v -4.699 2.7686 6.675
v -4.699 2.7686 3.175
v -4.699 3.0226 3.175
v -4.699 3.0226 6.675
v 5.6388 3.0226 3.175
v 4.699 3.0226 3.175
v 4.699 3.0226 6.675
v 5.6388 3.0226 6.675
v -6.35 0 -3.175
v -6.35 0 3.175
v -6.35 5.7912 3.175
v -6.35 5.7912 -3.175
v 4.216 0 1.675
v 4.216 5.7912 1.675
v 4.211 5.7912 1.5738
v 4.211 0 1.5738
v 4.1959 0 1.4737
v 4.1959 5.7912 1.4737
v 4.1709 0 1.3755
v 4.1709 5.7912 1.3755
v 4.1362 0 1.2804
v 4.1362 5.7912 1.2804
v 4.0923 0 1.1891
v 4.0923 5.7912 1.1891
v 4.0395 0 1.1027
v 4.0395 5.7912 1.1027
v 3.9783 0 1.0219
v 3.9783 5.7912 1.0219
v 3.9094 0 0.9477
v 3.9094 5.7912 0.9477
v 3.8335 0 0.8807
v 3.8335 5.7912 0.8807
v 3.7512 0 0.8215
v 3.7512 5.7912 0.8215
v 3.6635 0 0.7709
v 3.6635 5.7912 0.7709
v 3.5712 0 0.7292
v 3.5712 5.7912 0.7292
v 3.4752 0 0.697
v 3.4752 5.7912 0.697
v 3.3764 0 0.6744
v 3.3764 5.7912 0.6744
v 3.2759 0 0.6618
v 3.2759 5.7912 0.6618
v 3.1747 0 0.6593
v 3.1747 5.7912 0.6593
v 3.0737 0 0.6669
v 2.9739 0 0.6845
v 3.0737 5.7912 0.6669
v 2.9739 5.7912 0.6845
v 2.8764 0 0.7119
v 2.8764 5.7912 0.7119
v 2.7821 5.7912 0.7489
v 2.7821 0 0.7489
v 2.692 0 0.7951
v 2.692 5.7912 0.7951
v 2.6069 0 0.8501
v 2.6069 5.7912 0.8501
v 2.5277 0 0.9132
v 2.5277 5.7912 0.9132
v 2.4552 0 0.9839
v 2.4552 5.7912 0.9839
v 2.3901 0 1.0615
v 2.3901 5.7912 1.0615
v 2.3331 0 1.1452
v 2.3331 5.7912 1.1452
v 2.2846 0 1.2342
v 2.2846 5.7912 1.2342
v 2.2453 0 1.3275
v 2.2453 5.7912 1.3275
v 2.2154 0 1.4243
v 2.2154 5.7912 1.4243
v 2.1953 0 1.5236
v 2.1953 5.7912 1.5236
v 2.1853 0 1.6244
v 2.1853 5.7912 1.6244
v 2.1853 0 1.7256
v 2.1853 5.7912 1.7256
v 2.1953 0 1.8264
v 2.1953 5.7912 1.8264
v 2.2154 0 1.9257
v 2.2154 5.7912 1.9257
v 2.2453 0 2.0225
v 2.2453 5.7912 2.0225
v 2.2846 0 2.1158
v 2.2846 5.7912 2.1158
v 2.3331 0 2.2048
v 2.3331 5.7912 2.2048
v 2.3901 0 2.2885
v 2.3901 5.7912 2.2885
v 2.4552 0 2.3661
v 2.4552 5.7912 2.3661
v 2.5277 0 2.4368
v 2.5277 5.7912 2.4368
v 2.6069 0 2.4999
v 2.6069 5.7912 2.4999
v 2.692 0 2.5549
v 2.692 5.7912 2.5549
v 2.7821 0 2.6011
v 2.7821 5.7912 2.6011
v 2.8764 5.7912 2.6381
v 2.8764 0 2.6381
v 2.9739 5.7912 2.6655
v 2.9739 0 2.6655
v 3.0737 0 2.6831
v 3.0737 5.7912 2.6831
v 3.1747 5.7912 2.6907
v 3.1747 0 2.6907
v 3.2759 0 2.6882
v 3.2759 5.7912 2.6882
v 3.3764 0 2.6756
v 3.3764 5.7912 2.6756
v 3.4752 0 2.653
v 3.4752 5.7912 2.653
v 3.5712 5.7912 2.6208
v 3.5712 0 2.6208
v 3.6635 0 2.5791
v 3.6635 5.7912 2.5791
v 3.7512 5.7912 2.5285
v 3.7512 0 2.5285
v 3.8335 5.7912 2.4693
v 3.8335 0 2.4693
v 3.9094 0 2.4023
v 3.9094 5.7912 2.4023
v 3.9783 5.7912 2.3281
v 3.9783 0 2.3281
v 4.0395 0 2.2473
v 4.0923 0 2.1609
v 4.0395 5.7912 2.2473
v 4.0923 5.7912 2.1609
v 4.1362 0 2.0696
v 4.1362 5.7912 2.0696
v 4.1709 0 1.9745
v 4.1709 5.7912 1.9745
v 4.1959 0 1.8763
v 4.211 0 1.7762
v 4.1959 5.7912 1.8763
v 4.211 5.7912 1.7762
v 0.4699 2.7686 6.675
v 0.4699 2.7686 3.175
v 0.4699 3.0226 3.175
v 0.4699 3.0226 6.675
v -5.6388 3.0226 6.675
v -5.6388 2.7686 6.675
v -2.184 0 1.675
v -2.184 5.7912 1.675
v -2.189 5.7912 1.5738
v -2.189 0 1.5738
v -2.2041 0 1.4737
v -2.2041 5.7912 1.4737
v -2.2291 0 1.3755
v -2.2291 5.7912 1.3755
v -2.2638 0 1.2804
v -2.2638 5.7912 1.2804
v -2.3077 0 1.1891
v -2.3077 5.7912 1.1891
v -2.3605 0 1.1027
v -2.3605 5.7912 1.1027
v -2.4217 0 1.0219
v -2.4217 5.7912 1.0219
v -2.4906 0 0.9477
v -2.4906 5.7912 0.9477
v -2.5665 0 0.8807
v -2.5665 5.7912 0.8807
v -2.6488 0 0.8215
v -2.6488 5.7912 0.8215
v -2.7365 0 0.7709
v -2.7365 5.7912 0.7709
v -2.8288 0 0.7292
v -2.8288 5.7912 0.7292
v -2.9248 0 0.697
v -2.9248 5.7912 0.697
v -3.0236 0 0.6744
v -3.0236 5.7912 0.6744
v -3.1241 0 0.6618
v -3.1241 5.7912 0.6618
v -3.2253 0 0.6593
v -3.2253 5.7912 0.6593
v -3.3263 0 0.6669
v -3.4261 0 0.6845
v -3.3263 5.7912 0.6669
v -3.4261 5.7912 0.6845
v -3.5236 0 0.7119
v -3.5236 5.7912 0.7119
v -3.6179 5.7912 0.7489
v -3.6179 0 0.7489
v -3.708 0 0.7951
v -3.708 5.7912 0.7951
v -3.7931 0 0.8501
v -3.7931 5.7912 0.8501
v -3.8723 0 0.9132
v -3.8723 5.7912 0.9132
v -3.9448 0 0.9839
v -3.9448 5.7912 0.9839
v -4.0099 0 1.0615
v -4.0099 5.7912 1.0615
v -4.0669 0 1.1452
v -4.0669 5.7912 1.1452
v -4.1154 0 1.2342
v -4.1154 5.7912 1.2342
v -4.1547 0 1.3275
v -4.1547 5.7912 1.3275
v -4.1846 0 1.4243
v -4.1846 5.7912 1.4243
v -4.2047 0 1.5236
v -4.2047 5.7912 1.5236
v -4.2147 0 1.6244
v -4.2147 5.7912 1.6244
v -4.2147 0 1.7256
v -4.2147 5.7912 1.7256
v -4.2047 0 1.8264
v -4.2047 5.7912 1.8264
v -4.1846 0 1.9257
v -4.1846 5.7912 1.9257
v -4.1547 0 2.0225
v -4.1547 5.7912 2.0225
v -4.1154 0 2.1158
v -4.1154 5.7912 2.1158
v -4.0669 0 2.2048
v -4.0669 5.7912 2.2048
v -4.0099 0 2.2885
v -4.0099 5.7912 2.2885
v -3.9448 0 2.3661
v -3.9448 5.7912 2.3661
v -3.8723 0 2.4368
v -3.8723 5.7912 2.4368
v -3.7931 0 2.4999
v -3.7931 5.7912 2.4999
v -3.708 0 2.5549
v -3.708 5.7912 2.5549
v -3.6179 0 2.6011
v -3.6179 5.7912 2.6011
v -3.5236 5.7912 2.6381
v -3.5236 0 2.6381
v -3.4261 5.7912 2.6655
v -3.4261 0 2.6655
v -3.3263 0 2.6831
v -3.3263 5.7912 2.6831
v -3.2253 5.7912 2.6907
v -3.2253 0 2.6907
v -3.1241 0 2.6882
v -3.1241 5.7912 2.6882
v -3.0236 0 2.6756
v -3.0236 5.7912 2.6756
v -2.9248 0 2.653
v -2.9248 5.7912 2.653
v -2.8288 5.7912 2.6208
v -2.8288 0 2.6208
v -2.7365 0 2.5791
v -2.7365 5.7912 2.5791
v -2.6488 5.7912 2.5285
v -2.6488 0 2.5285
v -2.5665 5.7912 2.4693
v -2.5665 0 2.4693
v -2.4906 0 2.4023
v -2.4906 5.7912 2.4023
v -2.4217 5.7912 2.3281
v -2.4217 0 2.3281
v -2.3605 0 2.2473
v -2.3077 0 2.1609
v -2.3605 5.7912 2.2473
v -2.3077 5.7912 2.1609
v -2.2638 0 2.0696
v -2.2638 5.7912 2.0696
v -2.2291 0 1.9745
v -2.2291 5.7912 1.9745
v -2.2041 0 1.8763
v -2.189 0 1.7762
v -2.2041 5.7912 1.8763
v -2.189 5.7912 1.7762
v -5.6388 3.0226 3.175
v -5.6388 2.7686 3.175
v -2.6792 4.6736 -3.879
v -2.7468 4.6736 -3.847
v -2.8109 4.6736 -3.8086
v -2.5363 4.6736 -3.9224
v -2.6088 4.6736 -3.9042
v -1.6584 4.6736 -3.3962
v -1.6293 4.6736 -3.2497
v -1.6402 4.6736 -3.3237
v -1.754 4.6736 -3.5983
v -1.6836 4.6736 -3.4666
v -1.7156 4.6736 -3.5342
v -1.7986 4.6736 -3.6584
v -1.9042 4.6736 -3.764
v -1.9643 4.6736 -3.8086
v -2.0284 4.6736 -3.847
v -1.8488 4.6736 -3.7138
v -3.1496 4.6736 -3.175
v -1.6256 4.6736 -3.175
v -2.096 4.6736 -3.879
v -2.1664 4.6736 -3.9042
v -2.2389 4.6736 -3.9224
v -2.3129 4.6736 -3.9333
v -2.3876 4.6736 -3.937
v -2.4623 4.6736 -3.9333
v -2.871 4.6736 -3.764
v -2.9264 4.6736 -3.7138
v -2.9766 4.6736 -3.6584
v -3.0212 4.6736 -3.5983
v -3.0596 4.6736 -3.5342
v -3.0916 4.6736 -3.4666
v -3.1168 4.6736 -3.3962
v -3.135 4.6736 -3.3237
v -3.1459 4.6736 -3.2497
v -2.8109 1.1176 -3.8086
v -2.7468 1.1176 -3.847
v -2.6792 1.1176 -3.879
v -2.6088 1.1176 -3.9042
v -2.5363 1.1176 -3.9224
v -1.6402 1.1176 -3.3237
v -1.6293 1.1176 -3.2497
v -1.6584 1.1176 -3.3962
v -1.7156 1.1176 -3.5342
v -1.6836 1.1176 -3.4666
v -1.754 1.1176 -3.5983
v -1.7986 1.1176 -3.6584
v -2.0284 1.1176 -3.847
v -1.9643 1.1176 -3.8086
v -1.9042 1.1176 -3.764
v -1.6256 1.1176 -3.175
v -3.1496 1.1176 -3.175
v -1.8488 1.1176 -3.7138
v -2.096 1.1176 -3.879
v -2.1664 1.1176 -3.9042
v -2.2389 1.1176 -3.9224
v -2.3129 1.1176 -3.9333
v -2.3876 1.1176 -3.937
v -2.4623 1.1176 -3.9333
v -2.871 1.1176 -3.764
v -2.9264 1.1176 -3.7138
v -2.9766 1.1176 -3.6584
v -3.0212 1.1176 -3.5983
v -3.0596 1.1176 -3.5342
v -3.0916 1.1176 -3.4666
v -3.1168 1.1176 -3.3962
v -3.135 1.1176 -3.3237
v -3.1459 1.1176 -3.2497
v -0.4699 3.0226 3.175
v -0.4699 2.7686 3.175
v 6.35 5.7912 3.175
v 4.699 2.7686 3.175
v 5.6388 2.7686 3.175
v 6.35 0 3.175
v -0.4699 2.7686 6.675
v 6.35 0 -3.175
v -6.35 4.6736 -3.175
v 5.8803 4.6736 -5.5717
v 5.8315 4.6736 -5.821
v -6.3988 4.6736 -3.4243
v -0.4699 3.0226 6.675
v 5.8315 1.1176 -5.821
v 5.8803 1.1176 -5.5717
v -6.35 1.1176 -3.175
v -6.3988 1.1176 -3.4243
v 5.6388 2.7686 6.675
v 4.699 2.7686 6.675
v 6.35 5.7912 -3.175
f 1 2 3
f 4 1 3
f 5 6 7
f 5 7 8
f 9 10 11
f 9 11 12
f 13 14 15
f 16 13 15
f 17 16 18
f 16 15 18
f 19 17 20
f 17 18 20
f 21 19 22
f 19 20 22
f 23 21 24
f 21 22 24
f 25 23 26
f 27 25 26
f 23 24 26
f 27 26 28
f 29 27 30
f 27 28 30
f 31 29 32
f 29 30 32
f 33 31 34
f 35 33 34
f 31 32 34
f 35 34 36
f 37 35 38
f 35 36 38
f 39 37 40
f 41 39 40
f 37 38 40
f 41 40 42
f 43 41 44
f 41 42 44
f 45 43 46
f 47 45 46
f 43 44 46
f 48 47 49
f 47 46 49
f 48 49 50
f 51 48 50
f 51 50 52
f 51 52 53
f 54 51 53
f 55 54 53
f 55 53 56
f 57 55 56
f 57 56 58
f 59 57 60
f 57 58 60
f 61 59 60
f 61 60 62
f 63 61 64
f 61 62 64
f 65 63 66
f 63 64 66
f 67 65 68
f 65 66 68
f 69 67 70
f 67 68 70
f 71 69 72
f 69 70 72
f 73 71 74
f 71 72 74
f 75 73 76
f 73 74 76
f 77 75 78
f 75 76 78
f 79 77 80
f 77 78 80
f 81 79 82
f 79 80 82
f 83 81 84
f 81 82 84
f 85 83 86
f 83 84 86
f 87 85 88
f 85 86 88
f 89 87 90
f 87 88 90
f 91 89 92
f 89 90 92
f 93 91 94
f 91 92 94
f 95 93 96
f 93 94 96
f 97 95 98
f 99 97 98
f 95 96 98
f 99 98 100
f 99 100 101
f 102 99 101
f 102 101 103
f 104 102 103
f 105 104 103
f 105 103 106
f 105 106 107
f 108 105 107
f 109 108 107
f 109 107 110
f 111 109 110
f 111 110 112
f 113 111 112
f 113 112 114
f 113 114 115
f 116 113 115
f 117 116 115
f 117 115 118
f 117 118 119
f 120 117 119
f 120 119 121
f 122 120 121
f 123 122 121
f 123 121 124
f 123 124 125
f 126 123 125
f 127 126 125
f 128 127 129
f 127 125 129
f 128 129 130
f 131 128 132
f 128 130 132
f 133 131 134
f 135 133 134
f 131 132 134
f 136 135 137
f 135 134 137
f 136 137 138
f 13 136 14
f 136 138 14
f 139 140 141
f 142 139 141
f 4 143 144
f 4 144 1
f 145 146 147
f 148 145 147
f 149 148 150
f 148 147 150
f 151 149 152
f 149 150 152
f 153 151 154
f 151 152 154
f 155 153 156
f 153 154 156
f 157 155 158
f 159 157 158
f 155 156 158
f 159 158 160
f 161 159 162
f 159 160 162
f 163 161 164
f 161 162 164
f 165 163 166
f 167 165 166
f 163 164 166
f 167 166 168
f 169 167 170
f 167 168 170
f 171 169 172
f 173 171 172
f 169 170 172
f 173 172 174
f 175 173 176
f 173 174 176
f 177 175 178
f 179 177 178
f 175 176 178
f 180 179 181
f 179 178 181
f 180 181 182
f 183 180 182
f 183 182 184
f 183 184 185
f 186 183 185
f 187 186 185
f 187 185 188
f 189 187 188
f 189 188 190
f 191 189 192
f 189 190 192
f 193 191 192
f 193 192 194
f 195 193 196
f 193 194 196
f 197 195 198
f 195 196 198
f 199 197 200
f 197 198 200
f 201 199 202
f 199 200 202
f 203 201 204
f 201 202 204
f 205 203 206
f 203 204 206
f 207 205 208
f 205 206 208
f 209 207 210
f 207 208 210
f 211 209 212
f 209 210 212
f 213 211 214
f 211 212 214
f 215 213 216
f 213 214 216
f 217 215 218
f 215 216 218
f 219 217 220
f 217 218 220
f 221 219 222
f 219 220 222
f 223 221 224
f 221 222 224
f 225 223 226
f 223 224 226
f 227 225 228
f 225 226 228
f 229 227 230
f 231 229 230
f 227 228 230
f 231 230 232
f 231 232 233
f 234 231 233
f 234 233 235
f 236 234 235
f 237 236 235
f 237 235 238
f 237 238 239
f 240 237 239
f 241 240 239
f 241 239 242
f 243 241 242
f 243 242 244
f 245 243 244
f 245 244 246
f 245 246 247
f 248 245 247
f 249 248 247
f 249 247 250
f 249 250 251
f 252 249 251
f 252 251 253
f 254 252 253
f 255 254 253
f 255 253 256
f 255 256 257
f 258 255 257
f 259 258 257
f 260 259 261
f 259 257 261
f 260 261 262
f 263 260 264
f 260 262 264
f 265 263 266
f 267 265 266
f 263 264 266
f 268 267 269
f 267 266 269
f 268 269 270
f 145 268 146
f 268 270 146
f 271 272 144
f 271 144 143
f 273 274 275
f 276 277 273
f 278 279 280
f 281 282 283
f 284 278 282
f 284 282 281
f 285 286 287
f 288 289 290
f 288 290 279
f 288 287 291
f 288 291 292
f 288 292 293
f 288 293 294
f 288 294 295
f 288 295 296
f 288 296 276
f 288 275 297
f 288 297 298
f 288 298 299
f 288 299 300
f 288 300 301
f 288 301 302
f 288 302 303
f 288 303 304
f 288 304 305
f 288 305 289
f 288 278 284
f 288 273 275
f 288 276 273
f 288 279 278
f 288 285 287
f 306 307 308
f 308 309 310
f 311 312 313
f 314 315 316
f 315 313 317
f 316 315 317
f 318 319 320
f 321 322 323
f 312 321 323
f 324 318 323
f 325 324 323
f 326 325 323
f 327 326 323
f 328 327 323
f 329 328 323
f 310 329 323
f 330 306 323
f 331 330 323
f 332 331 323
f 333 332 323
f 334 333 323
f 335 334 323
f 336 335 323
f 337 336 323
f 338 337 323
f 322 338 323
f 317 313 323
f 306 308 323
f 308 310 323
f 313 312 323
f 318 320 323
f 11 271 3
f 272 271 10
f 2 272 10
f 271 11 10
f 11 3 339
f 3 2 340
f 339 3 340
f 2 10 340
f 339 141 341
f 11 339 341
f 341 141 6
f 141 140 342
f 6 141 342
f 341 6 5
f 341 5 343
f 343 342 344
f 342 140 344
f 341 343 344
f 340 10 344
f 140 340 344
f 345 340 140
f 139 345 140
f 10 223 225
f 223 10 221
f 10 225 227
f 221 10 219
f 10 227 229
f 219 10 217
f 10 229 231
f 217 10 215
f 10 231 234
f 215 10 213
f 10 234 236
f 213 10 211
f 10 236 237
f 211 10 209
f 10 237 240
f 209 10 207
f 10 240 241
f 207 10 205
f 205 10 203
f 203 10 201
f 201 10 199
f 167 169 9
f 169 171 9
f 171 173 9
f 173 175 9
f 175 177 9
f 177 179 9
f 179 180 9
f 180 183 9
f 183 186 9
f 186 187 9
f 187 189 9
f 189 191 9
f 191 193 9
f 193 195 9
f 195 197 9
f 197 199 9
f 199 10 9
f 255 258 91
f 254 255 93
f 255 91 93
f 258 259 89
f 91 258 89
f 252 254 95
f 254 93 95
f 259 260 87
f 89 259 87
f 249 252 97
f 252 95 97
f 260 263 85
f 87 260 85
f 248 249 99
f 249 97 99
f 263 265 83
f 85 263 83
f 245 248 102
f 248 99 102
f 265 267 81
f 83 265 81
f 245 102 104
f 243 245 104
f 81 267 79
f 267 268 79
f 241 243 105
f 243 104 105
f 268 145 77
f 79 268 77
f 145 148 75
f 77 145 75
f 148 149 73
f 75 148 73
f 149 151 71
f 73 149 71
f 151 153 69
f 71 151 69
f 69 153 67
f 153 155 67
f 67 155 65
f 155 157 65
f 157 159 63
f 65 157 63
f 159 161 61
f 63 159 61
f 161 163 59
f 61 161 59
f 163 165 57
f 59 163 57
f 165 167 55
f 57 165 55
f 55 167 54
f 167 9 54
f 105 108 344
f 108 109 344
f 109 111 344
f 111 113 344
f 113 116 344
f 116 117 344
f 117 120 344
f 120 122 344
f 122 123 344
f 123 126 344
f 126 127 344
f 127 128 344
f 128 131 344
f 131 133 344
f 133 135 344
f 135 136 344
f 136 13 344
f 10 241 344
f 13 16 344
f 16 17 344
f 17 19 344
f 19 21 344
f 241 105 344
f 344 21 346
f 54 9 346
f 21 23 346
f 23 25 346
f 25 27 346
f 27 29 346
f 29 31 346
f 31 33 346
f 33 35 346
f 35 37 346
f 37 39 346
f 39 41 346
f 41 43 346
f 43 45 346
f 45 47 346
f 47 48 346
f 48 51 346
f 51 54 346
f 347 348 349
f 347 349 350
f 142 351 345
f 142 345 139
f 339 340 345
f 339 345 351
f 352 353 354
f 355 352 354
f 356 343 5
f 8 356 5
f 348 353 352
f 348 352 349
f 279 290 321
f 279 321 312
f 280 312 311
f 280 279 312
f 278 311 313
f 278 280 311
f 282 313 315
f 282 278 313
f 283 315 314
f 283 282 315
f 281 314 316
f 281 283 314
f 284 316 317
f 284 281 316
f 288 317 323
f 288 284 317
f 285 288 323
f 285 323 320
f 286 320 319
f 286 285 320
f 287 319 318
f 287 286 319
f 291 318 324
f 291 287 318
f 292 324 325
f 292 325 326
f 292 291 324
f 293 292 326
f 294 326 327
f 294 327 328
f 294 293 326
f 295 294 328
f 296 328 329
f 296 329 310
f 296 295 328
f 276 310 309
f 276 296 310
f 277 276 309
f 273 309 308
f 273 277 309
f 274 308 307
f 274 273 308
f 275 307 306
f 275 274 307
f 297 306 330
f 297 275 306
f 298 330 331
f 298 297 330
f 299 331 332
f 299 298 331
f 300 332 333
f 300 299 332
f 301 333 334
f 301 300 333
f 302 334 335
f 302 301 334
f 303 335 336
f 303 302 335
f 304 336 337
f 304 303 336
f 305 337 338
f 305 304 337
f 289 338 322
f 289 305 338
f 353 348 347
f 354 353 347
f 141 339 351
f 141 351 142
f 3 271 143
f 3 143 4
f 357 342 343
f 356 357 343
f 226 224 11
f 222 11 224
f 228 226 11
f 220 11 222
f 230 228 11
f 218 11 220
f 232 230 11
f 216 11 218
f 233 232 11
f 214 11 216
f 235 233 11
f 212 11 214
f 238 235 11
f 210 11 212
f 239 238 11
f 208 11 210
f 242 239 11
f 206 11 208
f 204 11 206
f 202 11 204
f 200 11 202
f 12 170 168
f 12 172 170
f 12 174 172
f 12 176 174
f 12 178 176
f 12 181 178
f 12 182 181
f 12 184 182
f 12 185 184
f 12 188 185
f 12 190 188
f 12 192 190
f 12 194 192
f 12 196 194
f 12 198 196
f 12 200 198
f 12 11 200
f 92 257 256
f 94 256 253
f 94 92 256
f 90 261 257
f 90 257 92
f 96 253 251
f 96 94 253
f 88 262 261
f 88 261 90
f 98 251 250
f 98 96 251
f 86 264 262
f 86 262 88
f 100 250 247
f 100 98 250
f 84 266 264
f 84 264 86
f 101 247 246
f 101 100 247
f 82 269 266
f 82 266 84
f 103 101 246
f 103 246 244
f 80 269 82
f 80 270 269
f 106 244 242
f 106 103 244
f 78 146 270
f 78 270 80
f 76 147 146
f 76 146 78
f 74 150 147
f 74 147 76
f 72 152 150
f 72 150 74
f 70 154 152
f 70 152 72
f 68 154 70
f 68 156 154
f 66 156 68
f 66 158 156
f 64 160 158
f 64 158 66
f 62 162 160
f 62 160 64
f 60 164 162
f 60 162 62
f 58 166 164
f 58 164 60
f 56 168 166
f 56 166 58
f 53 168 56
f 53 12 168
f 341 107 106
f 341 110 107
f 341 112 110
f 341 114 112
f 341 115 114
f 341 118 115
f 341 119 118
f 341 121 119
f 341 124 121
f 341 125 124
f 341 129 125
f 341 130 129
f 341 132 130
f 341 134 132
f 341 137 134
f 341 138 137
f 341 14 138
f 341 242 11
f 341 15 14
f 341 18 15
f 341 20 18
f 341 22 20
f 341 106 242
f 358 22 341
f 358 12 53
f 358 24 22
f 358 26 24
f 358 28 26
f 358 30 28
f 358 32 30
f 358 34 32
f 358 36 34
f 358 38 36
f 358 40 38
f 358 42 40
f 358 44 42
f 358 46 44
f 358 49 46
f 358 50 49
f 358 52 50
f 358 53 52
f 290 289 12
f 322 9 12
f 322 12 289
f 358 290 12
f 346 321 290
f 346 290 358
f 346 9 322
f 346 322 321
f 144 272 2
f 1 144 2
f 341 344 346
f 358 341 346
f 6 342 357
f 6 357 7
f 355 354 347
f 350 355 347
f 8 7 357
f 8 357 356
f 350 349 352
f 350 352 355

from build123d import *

# Parameters (mm, degrees)
SKETCH1_W           = 12.7
SKETCH1_H           = 6.35
BOSS_EXTRUDE1_DEPTH = 5.7912
SKETCH2_R           = 1.016
CUT_EXTRUDE1_DEPTH  = 5.7912
BOSS_EXTRUDE2_DEPTH = 3.556
SKETCH4_W           = 12.462950418
SKETCH4_H           = 3.556
BOSS_EXTRUDE3_DEPTH = 0.254
SKETCH5_W           = 0.9398
SKETCH5_H           = 0.254
BOSS_EXTRUDE4_DEPTH = 3.5


with BuildPart() as part:
    # Sketch1 → Boss-Extrude1 (new body)
    with BuildSketch(Plane(origin=(0, 0, 0), x_dir=(1, 0, 0), z_dir=(0, 1, 0))):
        Rectangle(SKETCH1_W, SKETCH1_H)
    extrude(amount=BOSS_EXTRUDE1_DEPTH)

    # Sketch2 → Cut-Extrude1 (cut)
    with BuildSketch(Plane(origin=(0, 5.7912, 0), x_dir=(1, 0, 0), z_dir=(0, 1, 0))):
        with Locations((3.2, -1.675)):
            Circle(SKETCH2_R)
        with Locations((-3.2, -1.675)):
            Circle(SKETCH2_R)
    extrude(amount=-CUT_EXTRUDE1_DEPTH, mode=Mode.SUBTRACT)

    # Sketch3 → Boss-Extrude2 (add)
    with BuildSketch(Plane(origin=(0, 4.6736, 0), x_dir=(1, 0, 0), z_dir=(0, 1, 0))):
        with BuildLine():
            Line((-3.1496, 3.175), (-1.6256, 3.175))
            ThreePointArc((-1.6256, 3.175), (-2.3876, 3.937), (-3.1496, 3.175))
        make_face()
    extrude(amount=-BOSS_EXTRUDE2_DEPTH)

    # Sketch5 → Boss-Extrude4 (add)
    with BuildSketch(Plane.XY.offset(3.175)):
        with Locations((-5.1689, 2.8956)):
            Rectangle(SKETCH5_W, SKETCH5_H)
        with Locations((0, 2.8956)):
            Rectangle(SKETCH5_W, SKETCH5_H)
        with Locations((5.1689, 2.8956)):
            Rectangle(SKETCH5_W, SKETCH5_H)
    extrude(amount=BOSS_EXTRUDE4_DEPTH)


with BuildPart() as body_2:
    # Sketch4 → Boss-Extrude3 (new body)
    with BuildSketch(Plane(origin=(-0.834017587, 0, -4.255941978), x_dir=(-0.981334679, 0, 0.192307692), z_dir=(-0.192307692, 0, -0.981334679))):
        with Locations((-0.610576923, 2.8956)):
            Rectangle(SKETCH4_W, SKETCH4_H)
    extrude(amount=BOSS_EXTRUDE3_DEPTH)


solid = Compound([part.part, body_2.part])
